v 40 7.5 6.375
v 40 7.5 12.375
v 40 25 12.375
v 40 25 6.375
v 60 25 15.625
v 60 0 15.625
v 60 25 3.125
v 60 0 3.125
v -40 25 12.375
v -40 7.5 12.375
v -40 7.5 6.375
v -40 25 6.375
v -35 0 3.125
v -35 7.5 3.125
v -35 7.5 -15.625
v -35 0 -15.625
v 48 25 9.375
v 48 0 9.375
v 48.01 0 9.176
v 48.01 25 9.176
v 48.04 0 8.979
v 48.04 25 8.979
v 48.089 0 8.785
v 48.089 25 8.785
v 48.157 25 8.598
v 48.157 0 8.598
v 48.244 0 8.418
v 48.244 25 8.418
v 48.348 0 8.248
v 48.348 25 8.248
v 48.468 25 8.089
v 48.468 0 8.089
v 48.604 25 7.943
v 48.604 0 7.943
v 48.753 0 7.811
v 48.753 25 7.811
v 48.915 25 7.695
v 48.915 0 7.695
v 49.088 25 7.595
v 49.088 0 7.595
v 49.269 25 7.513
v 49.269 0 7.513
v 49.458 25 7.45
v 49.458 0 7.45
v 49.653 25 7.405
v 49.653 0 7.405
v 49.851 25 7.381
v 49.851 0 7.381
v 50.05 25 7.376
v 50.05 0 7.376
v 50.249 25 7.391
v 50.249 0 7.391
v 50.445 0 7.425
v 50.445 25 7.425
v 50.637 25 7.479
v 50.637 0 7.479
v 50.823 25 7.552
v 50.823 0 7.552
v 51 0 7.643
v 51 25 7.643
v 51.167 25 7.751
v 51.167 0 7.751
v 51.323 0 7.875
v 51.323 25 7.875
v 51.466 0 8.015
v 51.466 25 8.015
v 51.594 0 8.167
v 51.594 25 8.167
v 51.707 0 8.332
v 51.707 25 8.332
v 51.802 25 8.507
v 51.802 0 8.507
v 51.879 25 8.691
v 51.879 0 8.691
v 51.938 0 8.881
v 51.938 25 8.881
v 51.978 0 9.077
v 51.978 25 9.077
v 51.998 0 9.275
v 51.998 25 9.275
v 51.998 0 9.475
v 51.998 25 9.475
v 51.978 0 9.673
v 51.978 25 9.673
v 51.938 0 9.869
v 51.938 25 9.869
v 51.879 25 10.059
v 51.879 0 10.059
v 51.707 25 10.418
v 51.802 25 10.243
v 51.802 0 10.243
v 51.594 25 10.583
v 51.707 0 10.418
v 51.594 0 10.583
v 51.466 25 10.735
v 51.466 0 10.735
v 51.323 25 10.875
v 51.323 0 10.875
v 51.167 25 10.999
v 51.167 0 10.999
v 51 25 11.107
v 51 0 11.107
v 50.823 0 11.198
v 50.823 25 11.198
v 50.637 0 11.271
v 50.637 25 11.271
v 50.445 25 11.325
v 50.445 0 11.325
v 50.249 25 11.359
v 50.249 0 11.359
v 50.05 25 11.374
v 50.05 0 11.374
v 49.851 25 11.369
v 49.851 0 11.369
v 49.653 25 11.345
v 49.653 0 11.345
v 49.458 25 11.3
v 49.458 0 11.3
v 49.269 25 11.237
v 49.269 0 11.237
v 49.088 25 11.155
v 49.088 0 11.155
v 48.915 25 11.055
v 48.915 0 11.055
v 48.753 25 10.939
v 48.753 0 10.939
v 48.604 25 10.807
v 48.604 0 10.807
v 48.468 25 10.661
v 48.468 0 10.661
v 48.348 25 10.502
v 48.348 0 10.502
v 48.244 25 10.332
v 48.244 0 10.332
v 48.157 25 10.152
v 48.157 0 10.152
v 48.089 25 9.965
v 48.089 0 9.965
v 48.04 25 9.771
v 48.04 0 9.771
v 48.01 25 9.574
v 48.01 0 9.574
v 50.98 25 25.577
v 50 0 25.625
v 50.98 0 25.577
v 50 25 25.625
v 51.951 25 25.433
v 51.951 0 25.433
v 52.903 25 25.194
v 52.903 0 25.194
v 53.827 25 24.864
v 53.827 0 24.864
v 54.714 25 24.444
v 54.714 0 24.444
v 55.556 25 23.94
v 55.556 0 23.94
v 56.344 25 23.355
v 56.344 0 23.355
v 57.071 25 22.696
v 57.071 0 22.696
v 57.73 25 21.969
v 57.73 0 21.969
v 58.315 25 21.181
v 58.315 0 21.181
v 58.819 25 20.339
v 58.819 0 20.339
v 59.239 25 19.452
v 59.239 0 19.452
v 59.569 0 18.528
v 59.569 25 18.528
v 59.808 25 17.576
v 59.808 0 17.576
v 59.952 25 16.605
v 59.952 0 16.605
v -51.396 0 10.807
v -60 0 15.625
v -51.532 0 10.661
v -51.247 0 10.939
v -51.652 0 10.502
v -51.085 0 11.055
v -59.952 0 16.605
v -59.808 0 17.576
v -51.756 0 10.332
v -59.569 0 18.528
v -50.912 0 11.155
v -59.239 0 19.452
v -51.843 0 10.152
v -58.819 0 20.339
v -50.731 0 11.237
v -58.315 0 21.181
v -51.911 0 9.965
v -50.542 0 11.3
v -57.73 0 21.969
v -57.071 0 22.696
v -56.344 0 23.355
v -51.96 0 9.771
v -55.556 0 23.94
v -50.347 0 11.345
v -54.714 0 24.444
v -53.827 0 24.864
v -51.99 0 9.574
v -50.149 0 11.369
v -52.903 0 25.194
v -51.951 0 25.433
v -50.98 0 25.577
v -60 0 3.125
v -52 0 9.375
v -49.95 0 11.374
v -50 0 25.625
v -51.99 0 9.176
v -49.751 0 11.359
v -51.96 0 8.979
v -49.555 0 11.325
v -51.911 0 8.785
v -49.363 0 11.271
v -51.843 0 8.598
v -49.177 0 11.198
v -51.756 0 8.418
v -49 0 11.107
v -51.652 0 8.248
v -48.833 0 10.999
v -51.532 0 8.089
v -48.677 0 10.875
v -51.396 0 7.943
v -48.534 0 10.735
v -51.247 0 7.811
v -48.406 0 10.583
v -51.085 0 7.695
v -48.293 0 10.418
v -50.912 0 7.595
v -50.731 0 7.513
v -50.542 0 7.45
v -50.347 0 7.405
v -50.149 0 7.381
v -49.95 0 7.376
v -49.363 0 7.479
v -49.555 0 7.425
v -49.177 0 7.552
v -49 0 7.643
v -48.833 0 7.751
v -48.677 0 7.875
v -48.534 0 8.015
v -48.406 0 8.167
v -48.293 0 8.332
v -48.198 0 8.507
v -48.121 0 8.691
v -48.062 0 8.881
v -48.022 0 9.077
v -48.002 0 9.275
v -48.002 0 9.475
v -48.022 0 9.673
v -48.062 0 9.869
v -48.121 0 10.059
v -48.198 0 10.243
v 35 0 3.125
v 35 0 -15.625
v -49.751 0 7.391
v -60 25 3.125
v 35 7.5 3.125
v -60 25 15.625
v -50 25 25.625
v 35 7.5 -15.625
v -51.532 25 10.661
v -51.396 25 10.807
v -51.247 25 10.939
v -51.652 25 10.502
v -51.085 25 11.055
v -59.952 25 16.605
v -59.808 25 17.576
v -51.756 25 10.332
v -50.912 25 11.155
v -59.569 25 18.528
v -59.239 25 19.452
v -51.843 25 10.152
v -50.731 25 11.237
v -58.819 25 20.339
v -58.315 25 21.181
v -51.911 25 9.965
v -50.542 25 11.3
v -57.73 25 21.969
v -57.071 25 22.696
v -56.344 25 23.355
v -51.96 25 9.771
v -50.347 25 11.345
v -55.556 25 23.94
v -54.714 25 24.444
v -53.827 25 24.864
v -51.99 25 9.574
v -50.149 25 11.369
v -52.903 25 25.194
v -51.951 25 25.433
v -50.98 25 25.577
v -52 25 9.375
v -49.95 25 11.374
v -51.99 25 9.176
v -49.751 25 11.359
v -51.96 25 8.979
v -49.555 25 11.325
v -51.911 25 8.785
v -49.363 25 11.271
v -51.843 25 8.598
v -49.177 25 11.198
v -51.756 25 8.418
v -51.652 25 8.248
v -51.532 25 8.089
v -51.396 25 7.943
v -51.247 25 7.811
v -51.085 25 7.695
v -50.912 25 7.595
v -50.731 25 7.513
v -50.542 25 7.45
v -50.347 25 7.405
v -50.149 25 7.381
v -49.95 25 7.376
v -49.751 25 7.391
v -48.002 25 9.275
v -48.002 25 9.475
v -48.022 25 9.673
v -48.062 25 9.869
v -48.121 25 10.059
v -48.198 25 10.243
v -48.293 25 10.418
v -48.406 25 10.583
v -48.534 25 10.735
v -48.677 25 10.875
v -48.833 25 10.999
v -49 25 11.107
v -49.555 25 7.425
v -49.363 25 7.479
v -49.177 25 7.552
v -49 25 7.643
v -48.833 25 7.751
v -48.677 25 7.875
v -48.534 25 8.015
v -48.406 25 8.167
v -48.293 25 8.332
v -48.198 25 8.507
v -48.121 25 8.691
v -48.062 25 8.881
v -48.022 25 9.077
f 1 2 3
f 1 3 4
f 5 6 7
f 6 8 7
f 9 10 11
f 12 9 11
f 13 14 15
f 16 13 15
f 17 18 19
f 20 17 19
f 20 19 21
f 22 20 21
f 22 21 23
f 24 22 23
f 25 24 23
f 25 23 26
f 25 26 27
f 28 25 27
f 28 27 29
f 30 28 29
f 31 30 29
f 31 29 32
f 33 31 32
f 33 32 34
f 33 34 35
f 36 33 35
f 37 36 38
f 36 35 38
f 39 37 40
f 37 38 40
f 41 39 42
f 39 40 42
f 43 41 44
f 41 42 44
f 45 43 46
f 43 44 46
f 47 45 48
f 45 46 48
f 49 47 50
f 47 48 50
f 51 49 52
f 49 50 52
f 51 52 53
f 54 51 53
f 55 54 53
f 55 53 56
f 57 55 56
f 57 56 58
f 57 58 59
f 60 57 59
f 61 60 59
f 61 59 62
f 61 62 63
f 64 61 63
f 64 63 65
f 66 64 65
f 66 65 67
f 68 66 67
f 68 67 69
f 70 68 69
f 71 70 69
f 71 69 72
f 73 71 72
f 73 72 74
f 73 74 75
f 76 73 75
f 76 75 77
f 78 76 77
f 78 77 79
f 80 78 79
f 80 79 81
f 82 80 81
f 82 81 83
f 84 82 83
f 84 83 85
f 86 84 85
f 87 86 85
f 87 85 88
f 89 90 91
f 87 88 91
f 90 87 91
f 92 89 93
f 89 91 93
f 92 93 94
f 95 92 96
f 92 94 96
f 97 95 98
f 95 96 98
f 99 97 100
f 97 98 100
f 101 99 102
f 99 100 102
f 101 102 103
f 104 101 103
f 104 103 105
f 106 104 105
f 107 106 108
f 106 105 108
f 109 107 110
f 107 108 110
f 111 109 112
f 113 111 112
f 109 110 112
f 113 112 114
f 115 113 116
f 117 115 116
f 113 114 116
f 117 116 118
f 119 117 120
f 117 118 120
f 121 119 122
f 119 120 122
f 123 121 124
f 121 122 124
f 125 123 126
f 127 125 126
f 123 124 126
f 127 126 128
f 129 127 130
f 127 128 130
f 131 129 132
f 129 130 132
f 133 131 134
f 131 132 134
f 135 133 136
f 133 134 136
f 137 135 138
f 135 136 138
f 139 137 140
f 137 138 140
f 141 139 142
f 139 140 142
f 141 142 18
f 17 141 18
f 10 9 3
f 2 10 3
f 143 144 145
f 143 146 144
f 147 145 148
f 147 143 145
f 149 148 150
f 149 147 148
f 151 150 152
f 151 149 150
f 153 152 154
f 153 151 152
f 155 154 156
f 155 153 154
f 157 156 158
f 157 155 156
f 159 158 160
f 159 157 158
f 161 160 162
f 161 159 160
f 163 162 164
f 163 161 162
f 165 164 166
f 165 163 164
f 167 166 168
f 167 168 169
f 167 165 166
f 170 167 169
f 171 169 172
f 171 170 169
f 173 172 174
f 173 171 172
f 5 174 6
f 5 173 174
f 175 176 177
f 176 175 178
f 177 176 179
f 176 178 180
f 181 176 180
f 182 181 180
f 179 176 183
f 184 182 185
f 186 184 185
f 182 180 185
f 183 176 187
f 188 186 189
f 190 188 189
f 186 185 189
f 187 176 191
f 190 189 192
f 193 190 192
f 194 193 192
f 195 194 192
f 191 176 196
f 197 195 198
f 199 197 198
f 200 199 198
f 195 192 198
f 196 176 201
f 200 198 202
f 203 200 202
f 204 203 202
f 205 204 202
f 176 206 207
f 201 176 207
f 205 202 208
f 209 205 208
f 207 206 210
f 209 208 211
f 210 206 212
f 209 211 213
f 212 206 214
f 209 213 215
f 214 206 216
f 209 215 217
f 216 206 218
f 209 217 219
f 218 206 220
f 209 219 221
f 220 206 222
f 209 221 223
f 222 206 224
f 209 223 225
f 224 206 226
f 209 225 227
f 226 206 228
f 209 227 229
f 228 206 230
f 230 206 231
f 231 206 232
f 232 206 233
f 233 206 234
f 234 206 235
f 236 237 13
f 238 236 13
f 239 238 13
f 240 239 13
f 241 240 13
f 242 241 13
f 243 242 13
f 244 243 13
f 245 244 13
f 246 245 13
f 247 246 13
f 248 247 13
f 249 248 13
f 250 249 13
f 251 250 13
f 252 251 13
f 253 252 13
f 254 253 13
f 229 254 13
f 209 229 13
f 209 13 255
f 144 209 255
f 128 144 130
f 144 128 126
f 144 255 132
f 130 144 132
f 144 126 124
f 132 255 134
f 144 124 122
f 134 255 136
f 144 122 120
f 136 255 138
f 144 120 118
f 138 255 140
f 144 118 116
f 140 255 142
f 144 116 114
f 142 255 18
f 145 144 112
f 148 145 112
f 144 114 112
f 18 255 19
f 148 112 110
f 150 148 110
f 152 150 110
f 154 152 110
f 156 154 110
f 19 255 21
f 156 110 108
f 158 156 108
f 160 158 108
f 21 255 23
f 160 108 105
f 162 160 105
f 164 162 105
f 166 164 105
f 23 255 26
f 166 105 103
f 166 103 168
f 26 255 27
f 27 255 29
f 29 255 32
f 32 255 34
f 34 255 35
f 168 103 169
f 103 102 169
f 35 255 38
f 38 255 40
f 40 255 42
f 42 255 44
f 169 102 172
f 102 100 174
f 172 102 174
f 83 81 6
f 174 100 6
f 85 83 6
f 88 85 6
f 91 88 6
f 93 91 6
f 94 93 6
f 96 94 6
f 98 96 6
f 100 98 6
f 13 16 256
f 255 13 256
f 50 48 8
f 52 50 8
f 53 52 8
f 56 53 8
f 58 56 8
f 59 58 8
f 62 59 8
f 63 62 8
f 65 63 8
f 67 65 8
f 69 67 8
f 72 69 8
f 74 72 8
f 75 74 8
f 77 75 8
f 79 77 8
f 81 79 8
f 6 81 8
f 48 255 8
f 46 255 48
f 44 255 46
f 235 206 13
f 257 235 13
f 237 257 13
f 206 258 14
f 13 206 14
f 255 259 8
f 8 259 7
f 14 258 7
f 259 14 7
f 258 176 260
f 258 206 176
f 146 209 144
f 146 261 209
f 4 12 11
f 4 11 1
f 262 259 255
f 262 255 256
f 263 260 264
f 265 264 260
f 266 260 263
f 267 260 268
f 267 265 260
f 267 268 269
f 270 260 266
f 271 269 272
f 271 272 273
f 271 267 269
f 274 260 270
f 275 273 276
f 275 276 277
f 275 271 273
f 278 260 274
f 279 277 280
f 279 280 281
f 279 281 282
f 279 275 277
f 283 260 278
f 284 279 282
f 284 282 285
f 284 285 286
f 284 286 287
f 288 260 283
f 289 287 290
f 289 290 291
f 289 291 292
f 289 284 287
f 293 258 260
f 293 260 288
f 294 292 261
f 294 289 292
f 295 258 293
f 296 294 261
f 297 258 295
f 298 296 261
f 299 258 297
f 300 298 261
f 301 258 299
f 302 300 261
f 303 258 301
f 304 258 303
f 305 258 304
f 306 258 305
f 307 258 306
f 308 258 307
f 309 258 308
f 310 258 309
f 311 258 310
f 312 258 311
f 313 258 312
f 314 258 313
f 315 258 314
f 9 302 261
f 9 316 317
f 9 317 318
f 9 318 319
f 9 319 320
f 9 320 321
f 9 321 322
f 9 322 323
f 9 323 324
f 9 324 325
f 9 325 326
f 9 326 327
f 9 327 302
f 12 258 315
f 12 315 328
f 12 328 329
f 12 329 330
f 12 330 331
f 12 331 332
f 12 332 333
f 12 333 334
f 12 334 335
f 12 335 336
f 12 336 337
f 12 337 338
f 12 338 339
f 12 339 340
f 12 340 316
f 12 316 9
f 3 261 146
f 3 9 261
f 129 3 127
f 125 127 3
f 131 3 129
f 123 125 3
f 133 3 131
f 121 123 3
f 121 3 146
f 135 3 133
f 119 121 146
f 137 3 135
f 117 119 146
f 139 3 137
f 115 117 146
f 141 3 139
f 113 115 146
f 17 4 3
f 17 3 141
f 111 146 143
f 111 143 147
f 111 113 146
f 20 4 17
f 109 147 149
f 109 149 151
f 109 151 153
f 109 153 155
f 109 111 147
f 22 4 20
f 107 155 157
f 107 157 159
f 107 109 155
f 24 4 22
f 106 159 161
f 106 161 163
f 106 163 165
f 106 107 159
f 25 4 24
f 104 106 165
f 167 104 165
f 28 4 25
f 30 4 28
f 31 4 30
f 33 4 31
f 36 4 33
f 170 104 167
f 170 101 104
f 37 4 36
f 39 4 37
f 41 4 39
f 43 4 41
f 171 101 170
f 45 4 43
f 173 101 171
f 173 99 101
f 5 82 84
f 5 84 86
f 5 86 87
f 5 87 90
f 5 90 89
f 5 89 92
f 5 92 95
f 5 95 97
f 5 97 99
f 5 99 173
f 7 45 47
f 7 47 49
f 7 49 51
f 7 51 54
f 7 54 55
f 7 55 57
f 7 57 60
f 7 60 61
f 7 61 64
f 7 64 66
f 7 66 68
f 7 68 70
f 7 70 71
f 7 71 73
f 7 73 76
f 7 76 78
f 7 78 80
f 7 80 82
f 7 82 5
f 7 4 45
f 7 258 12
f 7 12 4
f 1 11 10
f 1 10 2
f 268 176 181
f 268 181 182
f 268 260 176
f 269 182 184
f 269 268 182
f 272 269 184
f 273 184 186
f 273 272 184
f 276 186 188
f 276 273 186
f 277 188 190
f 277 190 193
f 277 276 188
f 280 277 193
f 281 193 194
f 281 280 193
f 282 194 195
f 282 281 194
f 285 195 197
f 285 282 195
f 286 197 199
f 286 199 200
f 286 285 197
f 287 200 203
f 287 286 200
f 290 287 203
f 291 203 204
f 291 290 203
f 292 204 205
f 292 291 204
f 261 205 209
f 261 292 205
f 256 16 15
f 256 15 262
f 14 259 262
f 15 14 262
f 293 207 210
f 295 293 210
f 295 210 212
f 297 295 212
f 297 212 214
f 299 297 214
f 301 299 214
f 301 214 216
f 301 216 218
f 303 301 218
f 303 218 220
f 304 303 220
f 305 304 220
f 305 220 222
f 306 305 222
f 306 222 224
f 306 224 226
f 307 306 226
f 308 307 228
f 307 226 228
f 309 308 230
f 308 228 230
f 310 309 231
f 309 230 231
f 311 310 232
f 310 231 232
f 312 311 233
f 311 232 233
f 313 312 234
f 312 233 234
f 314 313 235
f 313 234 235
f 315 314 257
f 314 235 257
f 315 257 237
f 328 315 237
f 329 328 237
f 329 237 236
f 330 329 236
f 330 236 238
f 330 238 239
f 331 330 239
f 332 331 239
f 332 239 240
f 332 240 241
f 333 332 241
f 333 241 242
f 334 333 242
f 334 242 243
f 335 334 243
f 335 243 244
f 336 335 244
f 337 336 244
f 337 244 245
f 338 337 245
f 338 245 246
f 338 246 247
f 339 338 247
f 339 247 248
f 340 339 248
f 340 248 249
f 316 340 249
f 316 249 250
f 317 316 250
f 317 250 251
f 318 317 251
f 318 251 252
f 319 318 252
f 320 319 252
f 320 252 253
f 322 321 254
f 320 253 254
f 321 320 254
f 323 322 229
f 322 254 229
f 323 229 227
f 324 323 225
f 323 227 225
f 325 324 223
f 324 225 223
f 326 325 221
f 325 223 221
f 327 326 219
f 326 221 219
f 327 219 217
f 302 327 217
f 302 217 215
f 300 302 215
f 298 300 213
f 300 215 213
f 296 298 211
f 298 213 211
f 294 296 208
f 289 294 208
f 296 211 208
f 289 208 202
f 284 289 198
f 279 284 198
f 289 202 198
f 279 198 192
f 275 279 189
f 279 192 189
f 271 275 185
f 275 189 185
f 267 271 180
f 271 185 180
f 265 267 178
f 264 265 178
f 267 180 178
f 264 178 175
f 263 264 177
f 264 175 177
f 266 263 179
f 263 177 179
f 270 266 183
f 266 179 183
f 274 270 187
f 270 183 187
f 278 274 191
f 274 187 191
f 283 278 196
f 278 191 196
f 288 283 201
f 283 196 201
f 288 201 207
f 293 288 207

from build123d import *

# Parameters (mm, degrees)
SKETCH1_W             = 120
SKETCH1_H             = 31.25
BOSS_EXTRUDE1_DEPTH   = 25
SKETCH2_W             = 18.75
SKETCH2_H             = 17.5
CUT_EXTRUDE1_DEPTH    = 124.568364175
F_4_0MM_DOWEL_HOLE1_D = 4
SKETCH5_W             = 120
SKETCH5_H             = 25
BOSS_EXTRUDE2_DEPTH   = 10
SKETCH6_W             = 80
SKETCH6_H             = 6
CUT_EXTRUDE2_DEPTH    = 17.5
FILLET1_R             = 10
SKETCH7_W             = 25
SKETCH7_H             = 18.75
CUT_EXTRUDE3_DEPTH    = 25


with BuildPart() as part:
    # Sketch1 → Boss-Extrude1 (new body)
    with BuildSketch(Plane(origin=(0, 0, 0), x_dir=(1, 0, 0), z_dir=(0, 1, 0))):
        Rectangle(SKETCH1_W, SKETCH1_H)
    extrude(amount=BOSS_EXTRUDE1_DEPTH)

    # Sketch2 → Cut-Extrude1 (cut, through all)
    with BuildSketch(Plane(origin=(60, 0, 0), x_dir=(0, 0, -1), z_dir=(1, 0, 0))):
        with Locations((6.25, 16.25)):
            Rectangle(SKETCH2_W, SKETCH2_H)
    extrude(amount=-CUT_EXTRUDE1_DEPTH, mode=Mode.SUBTRACT)

    # Ø4.0mm Dowel Hole1 (through all)
    with Locations(Plane(origin=(0, 25, 0), x_dir=(1, 0, 0), z_dir=(0, 1, 0))):
        with Locations((50, -9.375), (-50, -9.375)):
            Hole(F_4_0MM_DOWEL_HOLE1_D / 2)

    # Sketch5 → Boss-Extrude2 (add)
    with BuildSketch(Plane.XY.offset(15.625)):
        with Locations((0, 12.5)):
            Rectangle(SKETCH5_W, SKETCH5_H)
    extrude(amount=BOSS_EXTRUDE2_DEPTH)

    # Sketch6 → Cut-Extrude2 (cut)
    with BuildSketch(Plane(origin=(0, 25, 0), x_dir=(1, 0, 0), z_dir=(0, 1, 0))):
        with Locations((0, -9.375)):
            Rectangle(SKETCH6_W, SKETCH6_H)
    extrude(amount=-CUT_EXTRUDE2_DEPTH, mode=Mode.SUBTRACT)

    # Fillet1
    fillet1_edges = [part.edges().sort_by_distance(p)[0] for p in [
        (-60, 12.5, 25.625),
        (60, 12.5, 25.625),
    ]]
    fillet(fillet1_edges, radius=FILLET1_R)

    # Sketch7 → Cut-Extrude3 (cut)
    with BuildSketch(Plane(origin=(0, 7.5, 0), x_dir=(1, 0, 0), z_dir=(0, 1, 0))):
        with Locations((-47.5, 6.25)):
            Rectangle(SKETCH7_W, SKETCH7_H)
        with Locations((47.5, 6.25)):
            Rectangle(SKETCH7_W, SKETCH7_H)
    extrude(amount=-CUT_EXTRUDE3_DEPTH, mode=Mode.SUBTRACT)


solid = part.part
